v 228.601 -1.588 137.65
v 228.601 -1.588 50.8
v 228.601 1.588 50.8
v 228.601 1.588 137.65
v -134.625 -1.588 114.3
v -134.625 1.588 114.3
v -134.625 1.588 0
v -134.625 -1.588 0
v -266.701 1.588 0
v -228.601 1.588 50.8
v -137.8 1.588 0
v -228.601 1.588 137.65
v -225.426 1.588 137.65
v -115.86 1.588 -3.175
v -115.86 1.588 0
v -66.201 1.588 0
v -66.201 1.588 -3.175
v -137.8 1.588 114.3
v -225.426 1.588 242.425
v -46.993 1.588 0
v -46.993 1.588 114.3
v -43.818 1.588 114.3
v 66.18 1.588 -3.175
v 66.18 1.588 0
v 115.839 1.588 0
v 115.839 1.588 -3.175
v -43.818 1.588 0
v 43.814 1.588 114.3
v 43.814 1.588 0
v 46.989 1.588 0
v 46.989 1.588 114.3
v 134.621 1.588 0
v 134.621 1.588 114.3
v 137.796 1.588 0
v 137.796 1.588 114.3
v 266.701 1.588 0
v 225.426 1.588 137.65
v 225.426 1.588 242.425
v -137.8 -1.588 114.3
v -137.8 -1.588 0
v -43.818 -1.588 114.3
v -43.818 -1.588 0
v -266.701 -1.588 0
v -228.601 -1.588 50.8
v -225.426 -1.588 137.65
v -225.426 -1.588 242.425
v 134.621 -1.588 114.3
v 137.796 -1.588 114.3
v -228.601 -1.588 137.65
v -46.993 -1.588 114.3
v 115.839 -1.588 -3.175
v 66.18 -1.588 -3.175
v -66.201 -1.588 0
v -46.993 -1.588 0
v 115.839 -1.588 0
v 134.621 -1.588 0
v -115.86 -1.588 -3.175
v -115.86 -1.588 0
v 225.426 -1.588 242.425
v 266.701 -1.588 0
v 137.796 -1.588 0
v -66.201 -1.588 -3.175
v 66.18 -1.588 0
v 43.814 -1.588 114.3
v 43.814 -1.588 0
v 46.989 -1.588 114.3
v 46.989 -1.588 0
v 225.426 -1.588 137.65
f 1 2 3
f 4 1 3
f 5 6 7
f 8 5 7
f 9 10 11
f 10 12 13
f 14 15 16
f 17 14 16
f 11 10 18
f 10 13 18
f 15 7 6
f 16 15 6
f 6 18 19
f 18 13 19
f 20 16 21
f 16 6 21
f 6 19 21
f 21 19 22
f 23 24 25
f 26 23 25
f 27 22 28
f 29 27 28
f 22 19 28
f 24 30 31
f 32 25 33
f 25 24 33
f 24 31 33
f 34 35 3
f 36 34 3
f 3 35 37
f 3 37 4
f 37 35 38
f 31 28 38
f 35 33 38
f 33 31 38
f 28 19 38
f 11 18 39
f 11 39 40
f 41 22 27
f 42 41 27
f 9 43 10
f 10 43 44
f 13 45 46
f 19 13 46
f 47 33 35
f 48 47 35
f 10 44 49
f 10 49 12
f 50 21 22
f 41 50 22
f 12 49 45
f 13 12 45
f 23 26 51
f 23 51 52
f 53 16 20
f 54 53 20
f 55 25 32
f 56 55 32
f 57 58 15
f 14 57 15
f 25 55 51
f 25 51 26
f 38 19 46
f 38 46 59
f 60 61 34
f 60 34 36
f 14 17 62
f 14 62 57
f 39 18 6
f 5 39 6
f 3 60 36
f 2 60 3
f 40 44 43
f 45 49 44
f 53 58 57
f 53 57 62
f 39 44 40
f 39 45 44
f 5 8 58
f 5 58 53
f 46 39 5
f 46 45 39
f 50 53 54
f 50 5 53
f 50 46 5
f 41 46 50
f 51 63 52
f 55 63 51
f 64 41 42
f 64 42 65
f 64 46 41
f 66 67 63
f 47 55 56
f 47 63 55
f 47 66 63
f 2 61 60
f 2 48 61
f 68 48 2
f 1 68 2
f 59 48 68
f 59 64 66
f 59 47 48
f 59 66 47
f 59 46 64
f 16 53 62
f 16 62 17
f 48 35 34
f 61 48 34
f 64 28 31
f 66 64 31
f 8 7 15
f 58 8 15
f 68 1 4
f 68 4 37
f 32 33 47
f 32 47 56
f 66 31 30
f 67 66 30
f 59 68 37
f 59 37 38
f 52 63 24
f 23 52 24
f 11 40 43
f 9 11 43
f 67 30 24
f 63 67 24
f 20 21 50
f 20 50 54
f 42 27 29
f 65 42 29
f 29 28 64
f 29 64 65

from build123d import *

# Parameters (mm, degrees)
SKETCH1_W           = 457.2020066
SKETCH1_H           = 3.175
BOSS_EXTRUDE1_DEPTH = 242.425000036
SKETCH2_W           = 3.175
SKETCH2_H           = 114.3
CUT_EXTRUDE1_DEPTH  = 334.224218774
LPATTERN1_COUNT     = 4
LPATTERN1_PITCH     = 90.807
SKETCH3_W           = 49.658811606
SKETCH3_H           = 3.175
BOSS_EXTRUDE2_DEPTH = 3.175
BOSS_EXTRUDE3_DEPTH = 3.175
SKETCH5_W           = 3.175
SKETCH5_H           = 104.775
CUT_EXTRUDE2_DEPTH  = 3.175


with BuildPart() as part:
    # Sketch1 → Boss-Extrude1 (new body)
    with BuildSketch(Plane.XY):
        Rectangle(SKETCH1_W, SKETCH1_H)
    extrude(amount=BOSS_EXTRUDE1_DEPTH)

    # Sketch2 → Cut-Extrude1 (cut, through all)
    with BuildSketch(Plane(origin=(0, 1.5875, 0), x_dir=(1, 0, 0), z_dir=(0, 1, 0))):
        with Locations((136.2085033, -57.15)):
            Rectangle(SKETCH2_W, SKETCH2_H)
    cut_extrude1 = extrude(amount=-CUT_EXTRUDE1_DEPTH, mode=Mode.SUBTRACT)

    # LPattern1: Cut-Extrude1 ×4
    with Locations(*[(-i * LPATTERN1_PITCH, 0, 0) for i in range(1, LPATTERN1_COUNT)]):
        add(cut_extrude1, mode=Mode.SUBTRACT)

    # Sketch3 → Boss-Extrude2 (add)
    with BuildSketch(Plane(origin=(0, 0, 0), x_dir=(-1, 0, 0), z_dir=(0, 0, -1))):
        with Locations((-91.009597469, 0)):
            Rectangle(SKETCH3_W, SKETCH3_H)
        with Locations((91.030590869, 0)):
            Rectangle(SKETCH3_W, SKETCH3_H)
    extrude(amount=BOSS_EXTRUDE2_DEPTH)

    # Sketch4 → Boss-Extrude3 (add)
    with BuildSketch(Plane.XZ.offset(1.5875)):
        Polygon((-228.6010033, 0), (-266.7010033, 0), (-228.6010033, 50.8), align=None)
    boss_extrude3 = extrude(amount=-BOSS_EXTRUDE3_DEPTH)

    # Mirror1: Boss-Extrude3 across plane
    add(boss_extrude3.mirror(Plane(origin=(0, 0, 0), x_dir=(0, 0, 1), z_dir=(1, 0, 0))))

    # Sketch5 → Cut-Extrude2 (cut)
    with BuildSketch(Plane.XZ.offset(1.5875)):
        with Locations((-227.0135033, 190.037500036)):
            Rectangle(SKETCH5_W, SKETCH5_H)
    cut_extrude2 = extrude(amount=-CUT_EXTRUDE2_DEPTH, mode=Mode.SUBTRACT)

    # Mirror2: Cut-Extrude2 across plane
    add(cut_extrude2.mirror(Plane(origin=(0, 0, 0), x_dir=(0, 0, 1), z_dir=(1, 0, 0))), mode=Mode.SUBTRACT)


solid = part.part
